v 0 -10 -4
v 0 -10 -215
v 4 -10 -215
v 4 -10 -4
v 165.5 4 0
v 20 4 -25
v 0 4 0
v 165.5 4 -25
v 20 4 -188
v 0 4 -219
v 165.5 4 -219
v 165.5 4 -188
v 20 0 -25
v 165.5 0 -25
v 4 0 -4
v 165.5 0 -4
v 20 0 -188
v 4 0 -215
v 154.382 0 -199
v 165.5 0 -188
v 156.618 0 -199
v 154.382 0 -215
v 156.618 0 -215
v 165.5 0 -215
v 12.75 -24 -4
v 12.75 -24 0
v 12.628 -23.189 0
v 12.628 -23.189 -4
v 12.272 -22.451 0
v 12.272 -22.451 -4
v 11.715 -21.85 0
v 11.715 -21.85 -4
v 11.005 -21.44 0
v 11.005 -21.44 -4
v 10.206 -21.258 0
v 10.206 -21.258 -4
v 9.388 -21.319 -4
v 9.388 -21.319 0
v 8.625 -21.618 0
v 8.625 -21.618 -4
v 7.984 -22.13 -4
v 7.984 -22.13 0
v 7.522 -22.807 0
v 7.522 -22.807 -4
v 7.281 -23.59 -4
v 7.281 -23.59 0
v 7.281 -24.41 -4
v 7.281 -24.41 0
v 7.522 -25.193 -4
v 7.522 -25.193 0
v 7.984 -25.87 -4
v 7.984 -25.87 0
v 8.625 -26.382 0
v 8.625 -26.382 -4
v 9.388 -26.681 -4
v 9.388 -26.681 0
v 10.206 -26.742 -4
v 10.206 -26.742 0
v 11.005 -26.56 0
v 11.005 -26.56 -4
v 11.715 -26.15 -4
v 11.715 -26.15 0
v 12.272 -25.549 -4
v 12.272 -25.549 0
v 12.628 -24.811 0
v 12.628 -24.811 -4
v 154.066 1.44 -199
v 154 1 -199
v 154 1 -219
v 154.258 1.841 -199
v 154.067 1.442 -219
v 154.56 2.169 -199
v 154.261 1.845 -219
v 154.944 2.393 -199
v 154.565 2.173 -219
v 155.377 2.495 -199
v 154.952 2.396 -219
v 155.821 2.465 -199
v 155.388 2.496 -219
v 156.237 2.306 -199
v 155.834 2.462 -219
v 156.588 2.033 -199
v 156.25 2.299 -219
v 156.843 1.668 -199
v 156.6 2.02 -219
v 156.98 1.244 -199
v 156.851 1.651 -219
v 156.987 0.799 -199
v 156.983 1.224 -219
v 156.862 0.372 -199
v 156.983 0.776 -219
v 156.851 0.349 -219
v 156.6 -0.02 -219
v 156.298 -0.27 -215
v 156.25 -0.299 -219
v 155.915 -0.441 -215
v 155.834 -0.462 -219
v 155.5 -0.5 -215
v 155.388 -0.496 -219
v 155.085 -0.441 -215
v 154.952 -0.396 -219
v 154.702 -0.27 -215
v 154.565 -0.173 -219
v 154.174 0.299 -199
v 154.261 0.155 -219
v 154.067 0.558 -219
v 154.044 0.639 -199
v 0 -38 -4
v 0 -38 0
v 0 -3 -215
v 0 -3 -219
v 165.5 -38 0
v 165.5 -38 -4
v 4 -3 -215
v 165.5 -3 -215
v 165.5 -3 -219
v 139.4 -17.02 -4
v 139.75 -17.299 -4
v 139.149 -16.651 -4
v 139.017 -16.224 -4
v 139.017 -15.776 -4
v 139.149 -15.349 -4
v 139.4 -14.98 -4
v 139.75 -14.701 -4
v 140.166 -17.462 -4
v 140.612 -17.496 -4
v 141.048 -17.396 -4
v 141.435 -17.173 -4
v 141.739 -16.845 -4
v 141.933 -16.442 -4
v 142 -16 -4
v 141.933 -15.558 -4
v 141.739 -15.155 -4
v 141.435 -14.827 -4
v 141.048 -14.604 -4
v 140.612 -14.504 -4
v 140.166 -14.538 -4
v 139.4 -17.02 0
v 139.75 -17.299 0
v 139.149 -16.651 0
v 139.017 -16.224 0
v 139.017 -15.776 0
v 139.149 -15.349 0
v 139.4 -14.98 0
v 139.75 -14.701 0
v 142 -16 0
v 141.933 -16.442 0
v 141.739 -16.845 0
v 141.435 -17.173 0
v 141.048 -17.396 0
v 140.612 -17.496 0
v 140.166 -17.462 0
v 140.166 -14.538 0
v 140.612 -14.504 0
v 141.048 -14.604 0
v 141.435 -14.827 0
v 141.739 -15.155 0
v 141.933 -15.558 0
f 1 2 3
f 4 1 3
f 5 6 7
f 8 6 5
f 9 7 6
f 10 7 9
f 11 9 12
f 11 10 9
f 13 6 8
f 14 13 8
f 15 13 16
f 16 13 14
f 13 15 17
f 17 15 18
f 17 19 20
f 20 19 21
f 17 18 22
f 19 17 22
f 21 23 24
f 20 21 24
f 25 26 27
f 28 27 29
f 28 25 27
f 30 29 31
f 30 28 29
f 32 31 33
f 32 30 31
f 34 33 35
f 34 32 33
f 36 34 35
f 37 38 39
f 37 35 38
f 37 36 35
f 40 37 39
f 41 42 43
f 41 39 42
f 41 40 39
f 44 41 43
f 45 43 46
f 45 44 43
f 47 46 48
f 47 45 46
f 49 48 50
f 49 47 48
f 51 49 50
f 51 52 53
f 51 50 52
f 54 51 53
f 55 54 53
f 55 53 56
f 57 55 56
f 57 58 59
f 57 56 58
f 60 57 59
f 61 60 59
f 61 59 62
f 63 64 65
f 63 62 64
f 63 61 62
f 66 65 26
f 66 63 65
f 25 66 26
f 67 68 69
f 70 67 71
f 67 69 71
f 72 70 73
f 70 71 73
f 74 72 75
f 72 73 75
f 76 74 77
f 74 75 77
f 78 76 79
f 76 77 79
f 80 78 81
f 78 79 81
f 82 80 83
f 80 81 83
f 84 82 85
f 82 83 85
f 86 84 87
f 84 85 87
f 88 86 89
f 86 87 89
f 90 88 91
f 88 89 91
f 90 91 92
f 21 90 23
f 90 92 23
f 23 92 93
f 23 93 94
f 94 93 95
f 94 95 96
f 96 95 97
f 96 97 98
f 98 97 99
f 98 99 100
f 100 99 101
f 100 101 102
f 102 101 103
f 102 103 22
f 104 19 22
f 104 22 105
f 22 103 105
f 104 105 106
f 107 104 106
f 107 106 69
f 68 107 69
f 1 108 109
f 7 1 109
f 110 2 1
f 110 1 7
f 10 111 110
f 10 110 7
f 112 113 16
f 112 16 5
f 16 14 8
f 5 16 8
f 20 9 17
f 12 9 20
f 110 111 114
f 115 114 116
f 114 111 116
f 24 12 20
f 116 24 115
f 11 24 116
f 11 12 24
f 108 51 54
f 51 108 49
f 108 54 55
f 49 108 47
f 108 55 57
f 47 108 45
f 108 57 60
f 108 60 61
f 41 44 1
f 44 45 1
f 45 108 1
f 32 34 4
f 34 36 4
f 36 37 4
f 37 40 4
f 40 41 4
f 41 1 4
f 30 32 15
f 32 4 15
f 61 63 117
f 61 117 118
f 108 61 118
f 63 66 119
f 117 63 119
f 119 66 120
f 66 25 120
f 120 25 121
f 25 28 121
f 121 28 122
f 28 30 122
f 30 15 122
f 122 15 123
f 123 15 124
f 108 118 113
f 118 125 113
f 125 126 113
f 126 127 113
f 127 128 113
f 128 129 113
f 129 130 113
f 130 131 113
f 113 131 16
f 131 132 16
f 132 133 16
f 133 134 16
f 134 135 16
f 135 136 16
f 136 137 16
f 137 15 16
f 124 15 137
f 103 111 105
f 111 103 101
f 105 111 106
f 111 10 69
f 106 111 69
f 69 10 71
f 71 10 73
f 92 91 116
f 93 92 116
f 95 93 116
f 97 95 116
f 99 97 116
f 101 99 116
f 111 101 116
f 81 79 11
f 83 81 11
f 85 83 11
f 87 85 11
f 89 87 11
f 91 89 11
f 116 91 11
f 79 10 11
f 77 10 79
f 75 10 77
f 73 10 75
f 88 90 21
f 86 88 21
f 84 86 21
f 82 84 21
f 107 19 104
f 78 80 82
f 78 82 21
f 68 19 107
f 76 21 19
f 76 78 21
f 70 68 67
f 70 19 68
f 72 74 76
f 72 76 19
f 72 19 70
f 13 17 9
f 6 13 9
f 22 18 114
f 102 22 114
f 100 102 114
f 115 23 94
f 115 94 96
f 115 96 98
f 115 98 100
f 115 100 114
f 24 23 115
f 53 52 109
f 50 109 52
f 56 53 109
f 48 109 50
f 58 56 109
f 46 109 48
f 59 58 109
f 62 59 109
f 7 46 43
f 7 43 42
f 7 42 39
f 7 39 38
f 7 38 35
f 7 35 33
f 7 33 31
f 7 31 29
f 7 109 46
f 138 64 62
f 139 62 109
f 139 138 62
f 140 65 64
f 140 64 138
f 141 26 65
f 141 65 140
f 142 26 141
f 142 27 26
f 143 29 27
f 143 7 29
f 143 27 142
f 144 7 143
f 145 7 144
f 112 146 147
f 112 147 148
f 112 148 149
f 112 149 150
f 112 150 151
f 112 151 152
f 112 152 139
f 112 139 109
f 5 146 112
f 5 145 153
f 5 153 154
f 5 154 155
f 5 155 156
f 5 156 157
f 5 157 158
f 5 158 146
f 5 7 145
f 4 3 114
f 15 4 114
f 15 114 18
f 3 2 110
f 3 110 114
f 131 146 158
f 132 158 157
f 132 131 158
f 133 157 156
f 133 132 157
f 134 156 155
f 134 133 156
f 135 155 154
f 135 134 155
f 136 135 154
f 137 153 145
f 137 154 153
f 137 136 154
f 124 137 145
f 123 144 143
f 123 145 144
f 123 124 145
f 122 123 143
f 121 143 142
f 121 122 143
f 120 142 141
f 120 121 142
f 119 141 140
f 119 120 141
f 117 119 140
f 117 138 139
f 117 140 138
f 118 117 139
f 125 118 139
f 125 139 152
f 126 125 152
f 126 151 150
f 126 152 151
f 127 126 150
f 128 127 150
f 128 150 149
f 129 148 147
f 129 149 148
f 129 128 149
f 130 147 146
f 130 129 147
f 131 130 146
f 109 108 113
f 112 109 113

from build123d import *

# Parameters (mm, degrees)
SKETCH_1_W           = 165.5
SKETCH_1_H           = 38
EXTRUDE_1_DEPTH      = 4
SKETCH_2_W           = 20
SKETCH_2_H           = 215
EXTRUDE_2_DEPTH      = 4
SKETCH_3_W           = 211
SKETCH_3_H           = 10
EXTRUDE_3_DEPTH      = 4
SKETCH_4_W           = 145.5
SKETCH_4_H           = 25
EXTRUDE_4_DEPTH      = 4
SKETCH_5_R           = 1.5
CUT_EXTRUDE_1_DEPTH  = 4
SKETCH_6_W           = 165.5
SKETCH_6_H           = 7
EXTRUDE_5_DEPTH      = 4
SKETCH_7_W           = 145.5
SKETCH_7_H           = 27
EXTRUDE_6_DEPTH      = 4
SKETCH_8_R           = 2.75
CUT_EXTRUDE_2_DEPTH  = 4
MIRROR_START         = -4
MIRROR_3_OUTLINE_W   = 165.5
MIRROR_3_OUTLINE_H   = 42
MIRROR_3_OUTLINE_R   = 1.5
MIRROR_3_OUTLINE_R_2 = 2.75
MIRROR_3_DEPTH       = 4
MIRROR_START_2       = -215
MIRROR_3_2_DEPTH     = 211
MIRROR_START_3       = -25
MIRROR_3_3_OUTLINE_W = 145.5
MIRROR_3_3_OUTLINE_H = 4
MIRROR_3_3_DEPTH     = 21
MIRROR_START_4       = -219
MIRROR_3_4_OUTLINE_W = 165.5
MIRROR_3_4_OUTLINE_H = 7
MIRROR_3_4_DEPTH     = 4
SKETCH_9_W           = 186.740400525
SKETCH_9_H           = 237.71944978
CUT_EXTRUDE_3_DEPTH  = 278.696326947
SKETCH_10_W          = 145.5
SKETCH_10_H          = 27
EXTRUDE_7_DEPTH      = 4
SKETCH_11_R          = 1.5
CUT_EXTRUDE_4_DEPTH  = 20


# Read off the part's stored shape, not the designer's step: 镜向3
with BuildPart() as part:
    # 草图1 → 凸台-拉伸1 (new body)
    with BuildSketch(Plane.XY):
        with Locations((82.75, -19)):
            Rectangle(SKETCH_1_W, SKETCH_1_H)
    extrude(amount=EXTRUDE_1_DEPTH)

    # 草图2 → 凸台-拉伸2 (add)
    with BuildSketch(Plane(origin=(0, 0, 0), x_dir=(1, 0, 0), z_dir=(0, 1, 0))):
        with Locations((10, -107.5)):
            Rectangle(SKETCH_2_W, SKETCH_2_H)
    extrude(amount=EXTRUDE_2_DEPTH)

    # 草图3 → 凸台-拉伸3 (add)
    with BuildSketch(Plane.ZY):
        with Locations((109.5, -5)):
            Rectangle(SKETCH_3_W, SKETCH_3_H)
    extrude(amount=-EXTRUDE_3_DEPTH)

    # 草图4 → 凸台-拉伸4 (add)
    with BuildSketch(Plane(origin=(0, 0, 0), x_dir=(1, 0, 0), z_dir=(0, 1, 0))):
        with Locations((92.75, -12.5)):
            Rectangle(SKETCH_4_W, SKETCH_4_H)
    extrude(amount=EXTRUDE_4_DEPTH)

    # 草图5 → 切除-拉伸1 (cut)
    with BuildSketch(Plane(origin=(0, 0, 0), x_dir=(-1, 0, 0), z_dir=(0, 0, -1))):
        with Locations((-140.5, -16)):
            Circle(SKETCH_5_R)
    extrude(amount=-CUT_EXTRUDE_1_DEPTH, mode=Mode.SUBTRACT)

    # 草图6 → 凸台-拉伸5 (add)
    with BuildSketch(Plane.XY.offset(215)):
        with Locations((82.75, 0.5)):
            Rectangle(SKETCH_6_W, SKETCH_6_H)
    extrude(amount=EXTRUDE_5_DEPTH)

    # 草图8 → 切除-拉伸2 (cut)
    with BuildSketch(Plane(origin=(0, 0, 0), x_dir=(-1, 0, 0), z_dir=(0, 0, -1))):
        with Locations((-10, -24)):
            Circle(SKETCH_8_R)
    extrude(amount=-CUT_EXTRUDE_2_DEPTH, mode=Mode.SUBTRACT)

    # 镜向3 outline → 镜向3 (add)
    with BuildSketch(Plane.XY.offset(MIRROR_START)):
        with Locations((82.75, -17)):
            Rectangle(MIRROR_3_OUTLINE_W, MIRROR_3_OUTLINE_H)
        with Locations((140.5, -16)):
            Circle(MIRROR_3_OUTLINE_R, mode=Mode.SUBTRACT)
        with Locations((10, -24)):
            Circle(MIRROR_3_OUTLINE_R_2, mode=Mode.SUBTRACT)
    extrude(amount=MIRROR_3_DEPTH)

    # Mirror 3 2 outline → Mirror 3 2 (add)
    with BuildSketch(Plane.XY.offset(MIRROR_START_2)):
        Polygon((20, 0), (20, 4), (0, 4), (0, -10), (4, -10), (4, 0), align=None)
    extrude(amount=MIRROR_3_2_DEPTH)

    # Mirror 3 3 outline → Mirror 3 3 (add)
    with BuildSketch(Plane.XY.offset(MIRROR_START_3)):
        with Locations((92.75, 2)):
            Rectangle(MIRROR_3_3_OUTLINE_W, MIRROR_3_3_OUTLINE_H)
    extrude(amount=MIRROR_3_3_DEPTH)

    # Mirror 3 4 outline → Mirror 3 4 (add)
    with BuildSketch(Plane.XY.offset(MIRROR_START_4)):
        with Locations((82.75, 0.5)):
            Rectangle(MIRROR_3_4_OUTLINE_W, MIRROR_3_4_OUTLINE_H)
    extrude(amount=MIRROR_3_4_DEPTH)


with BuildPart() as body_2:
    # 草图7 → 凸台-拉伸6 (new body)
    with BuildSketch(Plane(origin=(0, 4, 0), x_dir=(1, 0, 0), z_dir=(0, 1, 0))):
        with Locations((92.75, -201.5)):
            Rectangle(SKETCH_7_W, SKETCH_7_H)
    extrude(amount=-EXTRUDE_6_DEPTH)


with BuildPart() as cut_extrude_3_tool:
    # 草图9 → 切除-拉伸3 (new, through all)
    with BuildSketch(Plane(origin=(0, 4, 0), x_dir=(1, 0, 0), z_dir=(0, 1, 0))):
        with Locations((93.370200263, -118.85972489)):
            Rectangle(SKETCH_9_W, SKETCH_9_H)
    extrude(amount=-CUT_EXTRUDE_3_DEPTH)


with BuildPart() as part_1:
    add(part.part)

    # 切除-拉伸3: cut by cut_extrude_3_tool
    add(cut_extrude_3_tool.part, mode=Mode.SUBTRACT)

    # 草图10 → 凸台-拉伸7 (add)
    with BuildSketch(Plane(origin=(0, 4, 0), x_dir=(1, 0, 0), z_dir=(0, 1, 0))):
        with Locations((92.75, 201.5)):
            Rectangle(SKETCH_10_W, SKETCH_10_H)
    extrude(amount=-EXTRUDE_7_DEPTH)

    # 草图11 → 切除-拉伸4 (cut)
    with BuildSketch(Plane(origin=(0, 0, -219), x_dir=(-1, 0, 0), z_dir=(0, 0, -1))):
        with Locations((-155.5, 1)):
            Circle(SKETCH_11_R)
    extrude(amount=-CUT_EXTRUDE_4_DEPTH, mode=Mode.SUBTRACT)


with BuildPart() as body_2_1:
    add(body_2.part)

    # 切除-拉伸3: cut by cut_extrude_3_tool
    add(cut_extrude_3_tool.part, mode=Mode.SUBTRACT)


solid = part_1.part
